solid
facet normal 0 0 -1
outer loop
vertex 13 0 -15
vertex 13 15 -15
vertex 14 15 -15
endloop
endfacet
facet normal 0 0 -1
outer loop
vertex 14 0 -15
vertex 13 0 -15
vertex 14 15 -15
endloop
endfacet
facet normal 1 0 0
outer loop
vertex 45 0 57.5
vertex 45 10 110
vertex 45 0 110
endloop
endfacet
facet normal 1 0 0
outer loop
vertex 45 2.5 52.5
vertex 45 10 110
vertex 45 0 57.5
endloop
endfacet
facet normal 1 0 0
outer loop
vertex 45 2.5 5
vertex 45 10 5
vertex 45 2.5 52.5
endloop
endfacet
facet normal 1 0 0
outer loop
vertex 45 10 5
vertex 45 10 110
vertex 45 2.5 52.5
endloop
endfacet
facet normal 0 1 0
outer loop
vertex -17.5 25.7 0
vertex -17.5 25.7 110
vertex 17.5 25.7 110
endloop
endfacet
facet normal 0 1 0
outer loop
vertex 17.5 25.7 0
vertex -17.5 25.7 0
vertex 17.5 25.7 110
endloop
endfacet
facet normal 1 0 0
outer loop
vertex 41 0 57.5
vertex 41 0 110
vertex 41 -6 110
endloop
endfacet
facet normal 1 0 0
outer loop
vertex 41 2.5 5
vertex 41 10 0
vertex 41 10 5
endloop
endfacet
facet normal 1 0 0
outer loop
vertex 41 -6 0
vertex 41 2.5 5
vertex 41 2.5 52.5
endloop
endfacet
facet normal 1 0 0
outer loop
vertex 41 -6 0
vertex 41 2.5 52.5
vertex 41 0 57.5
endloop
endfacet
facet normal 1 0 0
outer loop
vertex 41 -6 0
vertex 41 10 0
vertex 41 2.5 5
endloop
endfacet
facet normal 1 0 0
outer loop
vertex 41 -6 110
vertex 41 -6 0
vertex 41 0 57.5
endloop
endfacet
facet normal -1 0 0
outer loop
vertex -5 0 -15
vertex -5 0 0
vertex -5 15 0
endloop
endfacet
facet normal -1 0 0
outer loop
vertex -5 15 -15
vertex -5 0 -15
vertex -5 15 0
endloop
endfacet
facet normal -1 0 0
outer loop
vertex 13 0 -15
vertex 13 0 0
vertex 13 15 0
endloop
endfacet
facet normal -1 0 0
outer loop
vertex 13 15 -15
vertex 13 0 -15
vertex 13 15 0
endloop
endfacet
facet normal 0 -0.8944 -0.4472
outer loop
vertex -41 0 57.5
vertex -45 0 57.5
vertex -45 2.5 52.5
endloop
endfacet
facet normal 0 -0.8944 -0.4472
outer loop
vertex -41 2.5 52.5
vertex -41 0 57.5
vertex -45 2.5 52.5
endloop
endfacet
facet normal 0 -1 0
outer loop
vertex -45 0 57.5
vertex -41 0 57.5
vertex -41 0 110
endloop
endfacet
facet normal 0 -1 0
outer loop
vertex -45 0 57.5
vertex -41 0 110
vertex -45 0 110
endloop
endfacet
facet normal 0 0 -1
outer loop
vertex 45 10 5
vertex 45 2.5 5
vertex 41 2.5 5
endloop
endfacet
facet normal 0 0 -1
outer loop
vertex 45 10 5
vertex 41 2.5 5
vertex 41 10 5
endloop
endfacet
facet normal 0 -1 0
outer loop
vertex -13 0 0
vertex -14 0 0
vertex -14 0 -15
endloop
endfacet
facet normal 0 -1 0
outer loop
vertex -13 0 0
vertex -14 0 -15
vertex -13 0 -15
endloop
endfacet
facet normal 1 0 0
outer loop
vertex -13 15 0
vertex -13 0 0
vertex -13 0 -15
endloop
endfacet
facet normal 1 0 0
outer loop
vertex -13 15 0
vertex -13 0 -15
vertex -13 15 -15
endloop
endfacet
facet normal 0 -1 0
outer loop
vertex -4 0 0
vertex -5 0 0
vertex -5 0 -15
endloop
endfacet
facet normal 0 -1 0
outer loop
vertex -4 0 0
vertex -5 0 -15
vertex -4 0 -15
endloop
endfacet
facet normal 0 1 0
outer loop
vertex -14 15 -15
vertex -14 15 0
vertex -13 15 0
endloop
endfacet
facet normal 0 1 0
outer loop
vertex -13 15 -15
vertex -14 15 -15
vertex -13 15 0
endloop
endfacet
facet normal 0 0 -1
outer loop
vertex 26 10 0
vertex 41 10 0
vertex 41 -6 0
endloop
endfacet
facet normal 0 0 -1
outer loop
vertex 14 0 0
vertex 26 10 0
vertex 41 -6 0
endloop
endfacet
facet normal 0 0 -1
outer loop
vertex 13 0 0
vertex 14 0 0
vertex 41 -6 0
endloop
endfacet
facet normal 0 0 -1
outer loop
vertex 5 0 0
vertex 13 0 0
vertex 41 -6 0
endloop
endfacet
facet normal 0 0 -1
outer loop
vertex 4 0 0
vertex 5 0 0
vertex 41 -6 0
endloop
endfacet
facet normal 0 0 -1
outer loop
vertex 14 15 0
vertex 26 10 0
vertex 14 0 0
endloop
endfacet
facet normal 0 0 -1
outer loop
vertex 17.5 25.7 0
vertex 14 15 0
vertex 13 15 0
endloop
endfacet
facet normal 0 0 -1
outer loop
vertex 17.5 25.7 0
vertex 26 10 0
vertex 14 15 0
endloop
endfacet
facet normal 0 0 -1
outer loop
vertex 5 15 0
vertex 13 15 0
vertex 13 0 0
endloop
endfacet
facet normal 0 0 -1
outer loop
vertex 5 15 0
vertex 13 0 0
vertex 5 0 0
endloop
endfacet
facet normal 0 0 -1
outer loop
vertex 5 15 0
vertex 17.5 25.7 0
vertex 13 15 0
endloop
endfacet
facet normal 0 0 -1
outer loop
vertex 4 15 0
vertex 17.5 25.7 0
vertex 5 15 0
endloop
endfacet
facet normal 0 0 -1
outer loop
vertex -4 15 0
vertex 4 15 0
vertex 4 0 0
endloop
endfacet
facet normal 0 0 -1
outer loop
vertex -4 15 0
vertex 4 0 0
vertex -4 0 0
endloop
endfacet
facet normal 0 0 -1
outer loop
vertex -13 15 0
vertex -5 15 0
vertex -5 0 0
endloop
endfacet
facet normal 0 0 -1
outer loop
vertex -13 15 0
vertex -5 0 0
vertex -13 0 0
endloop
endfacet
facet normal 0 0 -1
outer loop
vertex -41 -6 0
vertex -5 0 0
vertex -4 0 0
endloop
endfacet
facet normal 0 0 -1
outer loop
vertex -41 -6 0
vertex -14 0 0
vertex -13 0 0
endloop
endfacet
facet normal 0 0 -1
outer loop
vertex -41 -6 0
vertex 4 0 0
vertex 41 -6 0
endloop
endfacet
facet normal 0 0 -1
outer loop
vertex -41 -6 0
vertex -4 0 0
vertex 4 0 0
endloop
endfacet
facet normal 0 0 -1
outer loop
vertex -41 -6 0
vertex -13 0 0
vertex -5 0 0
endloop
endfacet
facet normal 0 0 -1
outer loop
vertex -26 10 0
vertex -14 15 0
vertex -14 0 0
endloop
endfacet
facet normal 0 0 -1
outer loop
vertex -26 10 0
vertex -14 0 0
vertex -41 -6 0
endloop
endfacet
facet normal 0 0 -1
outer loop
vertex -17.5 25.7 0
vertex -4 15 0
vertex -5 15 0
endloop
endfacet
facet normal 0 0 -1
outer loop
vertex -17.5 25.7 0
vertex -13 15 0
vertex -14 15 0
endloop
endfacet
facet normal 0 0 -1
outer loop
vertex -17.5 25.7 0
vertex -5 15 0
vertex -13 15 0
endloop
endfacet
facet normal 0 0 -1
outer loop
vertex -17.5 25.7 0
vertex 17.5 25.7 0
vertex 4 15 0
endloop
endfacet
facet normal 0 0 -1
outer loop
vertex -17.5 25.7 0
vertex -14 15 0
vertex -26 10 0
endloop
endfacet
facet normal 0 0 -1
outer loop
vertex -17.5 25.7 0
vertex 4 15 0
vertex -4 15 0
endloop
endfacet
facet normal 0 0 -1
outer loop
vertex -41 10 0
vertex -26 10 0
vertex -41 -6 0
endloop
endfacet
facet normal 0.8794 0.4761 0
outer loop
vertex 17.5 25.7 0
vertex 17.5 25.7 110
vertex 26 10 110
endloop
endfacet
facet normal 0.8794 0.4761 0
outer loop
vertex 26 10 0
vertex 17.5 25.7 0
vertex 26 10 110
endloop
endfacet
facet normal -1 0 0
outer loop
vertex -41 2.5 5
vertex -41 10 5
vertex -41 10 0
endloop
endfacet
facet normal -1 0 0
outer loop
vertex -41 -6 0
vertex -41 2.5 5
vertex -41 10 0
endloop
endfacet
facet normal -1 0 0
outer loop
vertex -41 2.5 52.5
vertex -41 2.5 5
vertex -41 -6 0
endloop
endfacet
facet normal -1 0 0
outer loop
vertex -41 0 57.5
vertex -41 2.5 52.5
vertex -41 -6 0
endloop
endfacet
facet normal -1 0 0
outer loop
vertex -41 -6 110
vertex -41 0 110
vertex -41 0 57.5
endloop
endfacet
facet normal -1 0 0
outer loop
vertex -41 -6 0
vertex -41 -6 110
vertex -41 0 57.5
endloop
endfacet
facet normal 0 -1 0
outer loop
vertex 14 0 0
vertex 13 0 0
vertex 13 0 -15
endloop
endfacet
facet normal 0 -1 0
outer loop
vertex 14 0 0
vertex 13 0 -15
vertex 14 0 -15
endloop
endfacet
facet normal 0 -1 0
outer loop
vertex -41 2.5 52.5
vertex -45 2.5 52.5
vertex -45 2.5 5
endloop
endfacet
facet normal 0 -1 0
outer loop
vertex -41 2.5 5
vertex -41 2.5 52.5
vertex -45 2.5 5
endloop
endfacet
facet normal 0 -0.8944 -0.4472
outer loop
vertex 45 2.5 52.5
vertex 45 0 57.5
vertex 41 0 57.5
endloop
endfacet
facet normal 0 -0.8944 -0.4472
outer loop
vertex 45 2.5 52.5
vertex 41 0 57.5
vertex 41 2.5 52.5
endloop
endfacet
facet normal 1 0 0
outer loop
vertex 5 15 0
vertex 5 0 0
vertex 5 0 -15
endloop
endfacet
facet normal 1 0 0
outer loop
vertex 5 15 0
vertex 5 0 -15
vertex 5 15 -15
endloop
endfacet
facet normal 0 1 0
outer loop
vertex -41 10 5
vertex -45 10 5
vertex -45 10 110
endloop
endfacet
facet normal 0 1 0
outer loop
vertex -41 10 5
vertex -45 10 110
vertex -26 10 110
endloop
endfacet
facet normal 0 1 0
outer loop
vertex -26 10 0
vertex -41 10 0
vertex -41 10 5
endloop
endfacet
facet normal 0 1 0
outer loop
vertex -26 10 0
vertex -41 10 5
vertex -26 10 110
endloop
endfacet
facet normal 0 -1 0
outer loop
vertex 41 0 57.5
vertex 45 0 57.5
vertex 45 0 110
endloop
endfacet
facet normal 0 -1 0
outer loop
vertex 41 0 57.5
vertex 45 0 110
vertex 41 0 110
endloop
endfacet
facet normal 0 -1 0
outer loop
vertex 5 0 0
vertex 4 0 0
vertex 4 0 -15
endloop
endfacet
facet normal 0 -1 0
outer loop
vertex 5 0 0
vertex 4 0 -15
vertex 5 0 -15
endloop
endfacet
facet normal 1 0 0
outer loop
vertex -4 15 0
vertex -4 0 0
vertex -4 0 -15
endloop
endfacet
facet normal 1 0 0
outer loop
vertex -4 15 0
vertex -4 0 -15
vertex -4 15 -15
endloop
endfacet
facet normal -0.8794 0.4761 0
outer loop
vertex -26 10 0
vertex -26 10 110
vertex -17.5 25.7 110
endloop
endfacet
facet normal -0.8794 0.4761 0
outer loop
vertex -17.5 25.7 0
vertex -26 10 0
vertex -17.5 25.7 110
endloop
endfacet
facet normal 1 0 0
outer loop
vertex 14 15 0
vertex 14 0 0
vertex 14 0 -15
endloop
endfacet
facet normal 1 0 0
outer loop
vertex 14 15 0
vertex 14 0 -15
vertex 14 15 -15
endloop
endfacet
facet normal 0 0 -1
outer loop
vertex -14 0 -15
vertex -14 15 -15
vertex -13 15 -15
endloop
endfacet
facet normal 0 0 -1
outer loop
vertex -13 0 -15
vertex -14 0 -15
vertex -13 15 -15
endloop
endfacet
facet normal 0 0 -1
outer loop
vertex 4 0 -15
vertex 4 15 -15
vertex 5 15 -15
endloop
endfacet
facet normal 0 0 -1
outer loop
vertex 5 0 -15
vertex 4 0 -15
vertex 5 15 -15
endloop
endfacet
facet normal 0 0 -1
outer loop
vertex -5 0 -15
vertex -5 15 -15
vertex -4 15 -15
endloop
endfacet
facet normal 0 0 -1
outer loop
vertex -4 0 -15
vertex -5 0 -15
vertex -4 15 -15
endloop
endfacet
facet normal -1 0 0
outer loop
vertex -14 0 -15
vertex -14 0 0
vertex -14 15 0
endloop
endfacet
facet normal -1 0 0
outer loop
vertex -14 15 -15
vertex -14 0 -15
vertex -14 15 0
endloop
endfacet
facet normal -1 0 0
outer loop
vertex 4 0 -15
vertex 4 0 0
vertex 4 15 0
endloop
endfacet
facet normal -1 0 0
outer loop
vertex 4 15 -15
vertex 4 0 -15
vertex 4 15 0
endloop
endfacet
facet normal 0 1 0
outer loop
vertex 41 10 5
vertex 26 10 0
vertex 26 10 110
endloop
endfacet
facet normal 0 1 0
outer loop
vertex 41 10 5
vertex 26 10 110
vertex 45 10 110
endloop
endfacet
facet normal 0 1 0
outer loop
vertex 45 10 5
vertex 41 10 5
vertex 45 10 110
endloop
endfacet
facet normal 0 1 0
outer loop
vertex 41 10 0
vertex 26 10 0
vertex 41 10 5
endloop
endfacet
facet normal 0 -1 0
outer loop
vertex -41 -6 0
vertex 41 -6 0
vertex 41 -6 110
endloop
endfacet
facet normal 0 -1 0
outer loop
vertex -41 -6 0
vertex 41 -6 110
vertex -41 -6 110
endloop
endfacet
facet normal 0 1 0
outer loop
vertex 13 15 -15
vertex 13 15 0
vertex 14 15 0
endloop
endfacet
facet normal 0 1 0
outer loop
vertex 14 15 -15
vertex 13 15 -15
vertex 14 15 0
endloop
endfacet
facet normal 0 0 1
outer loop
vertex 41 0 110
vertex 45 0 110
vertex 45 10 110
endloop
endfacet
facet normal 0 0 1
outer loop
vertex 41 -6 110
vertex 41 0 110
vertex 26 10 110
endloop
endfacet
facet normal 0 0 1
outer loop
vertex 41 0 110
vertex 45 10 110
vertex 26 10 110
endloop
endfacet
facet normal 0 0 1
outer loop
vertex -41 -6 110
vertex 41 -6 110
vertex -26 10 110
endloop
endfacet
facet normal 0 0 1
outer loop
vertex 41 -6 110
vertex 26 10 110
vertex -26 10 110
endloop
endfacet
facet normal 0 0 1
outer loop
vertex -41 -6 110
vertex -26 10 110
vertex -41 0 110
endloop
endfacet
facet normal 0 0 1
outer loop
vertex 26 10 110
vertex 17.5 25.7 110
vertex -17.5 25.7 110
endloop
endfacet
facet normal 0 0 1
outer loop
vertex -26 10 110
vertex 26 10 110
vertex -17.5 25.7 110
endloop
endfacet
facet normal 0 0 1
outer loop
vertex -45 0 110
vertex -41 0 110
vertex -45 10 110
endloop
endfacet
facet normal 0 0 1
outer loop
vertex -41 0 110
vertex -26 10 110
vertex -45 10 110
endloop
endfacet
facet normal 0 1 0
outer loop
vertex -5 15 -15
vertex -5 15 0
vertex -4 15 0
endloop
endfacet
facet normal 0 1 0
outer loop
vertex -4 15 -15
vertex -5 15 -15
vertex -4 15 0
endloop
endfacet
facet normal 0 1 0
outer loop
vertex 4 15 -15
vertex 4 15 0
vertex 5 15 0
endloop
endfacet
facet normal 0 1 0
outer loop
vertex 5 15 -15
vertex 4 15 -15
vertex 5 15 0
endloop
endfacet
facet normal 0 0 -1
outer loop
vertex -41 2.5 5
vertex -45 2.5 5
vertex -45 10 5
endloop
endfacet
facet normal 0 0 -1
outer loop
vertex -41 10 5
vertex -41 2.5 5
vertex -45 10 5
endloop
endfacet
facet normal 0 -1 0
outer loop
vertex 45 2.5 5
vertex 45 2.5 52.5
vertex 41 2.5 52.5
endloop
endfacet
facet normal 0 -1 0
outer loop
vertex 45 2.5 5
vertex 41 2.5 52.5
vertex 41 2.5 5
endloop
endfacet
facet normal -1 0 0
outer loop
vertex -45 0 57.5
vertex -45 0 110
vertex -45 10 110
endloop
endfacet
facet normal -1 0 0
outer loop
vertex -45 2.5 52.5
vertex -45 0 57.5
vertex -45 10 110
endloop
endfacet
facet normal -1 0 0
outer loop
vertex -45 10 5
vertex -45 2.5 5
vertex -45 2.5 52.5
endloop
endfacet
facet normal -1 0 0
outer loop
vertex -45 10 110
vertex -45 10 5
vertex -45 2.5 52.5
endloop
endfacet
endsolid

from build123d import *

# Parameters (mm, degrees)
PAD_DEPTH       = 110
POCKET_DEPTH    = 4
POCKET002_DEPTH = 4
SKETCH003_W     = 1
SKETCH003_H     = 15
PAD001_DEPTH    = 15


with BuildPart() as part:
    # Sketch → Pad (new body)
    with BuildSketch(Plane.XY):
        Polygon((-17.5, 25.7), (17.5, 25.7), (26, 10), (45, 10), (45, 0), (41, 0), (41, -6), (-41, -6), (-41, 0), (-45, 0), (-45, 10), (-26, 10), align=None)
    extrude(amount=PAD_DEPTH)

    # Sketch001 → Pocket (cut)
    with BuildSketch(Plane.YZ.offset(-45)):
        Polygon((2.5, 5), (10, 5), (10, 0), (0, 0), (0, 57.5), (2.5, 52.5), align=None)
    extrude(amount=POCKET_DEPTH, mode=Mode.SUBTRACT)

    # Sketch002 → Pocket002 (cut)
    with BuildSketch(Plane.YZ.offset(45)):
        Polygon((2.5, 5), (10, 5), (10, 0), (0, 0), (0, 57.5), (2.5, 52.5), align=None)
    extrude(amount=-POCKET002_DEPTH, mode=Mode.SUBTRACT)

    # Sketch003 → Pad001 (join)
    with BuildSketch(Plane.XY):
        with Locations((-13.5, 7.5)):
            Rectangle(SKETCH003_W, SKETCH003_H)
        with Locations((-4.5, 7.5)):
            Rectangle(SKETCH003_W, SKETCH003_H)
        with Locations((4.5, 7.5)):
            Rectangle(SKETCH003_W, SKETCH003_H)
        with Locations((13.5, 7.5)):
            Rectangle(SKETCH003_W, SKETCH003_H)
    extrude(amount=-PAD001_DEPTH)


solid = part.part
